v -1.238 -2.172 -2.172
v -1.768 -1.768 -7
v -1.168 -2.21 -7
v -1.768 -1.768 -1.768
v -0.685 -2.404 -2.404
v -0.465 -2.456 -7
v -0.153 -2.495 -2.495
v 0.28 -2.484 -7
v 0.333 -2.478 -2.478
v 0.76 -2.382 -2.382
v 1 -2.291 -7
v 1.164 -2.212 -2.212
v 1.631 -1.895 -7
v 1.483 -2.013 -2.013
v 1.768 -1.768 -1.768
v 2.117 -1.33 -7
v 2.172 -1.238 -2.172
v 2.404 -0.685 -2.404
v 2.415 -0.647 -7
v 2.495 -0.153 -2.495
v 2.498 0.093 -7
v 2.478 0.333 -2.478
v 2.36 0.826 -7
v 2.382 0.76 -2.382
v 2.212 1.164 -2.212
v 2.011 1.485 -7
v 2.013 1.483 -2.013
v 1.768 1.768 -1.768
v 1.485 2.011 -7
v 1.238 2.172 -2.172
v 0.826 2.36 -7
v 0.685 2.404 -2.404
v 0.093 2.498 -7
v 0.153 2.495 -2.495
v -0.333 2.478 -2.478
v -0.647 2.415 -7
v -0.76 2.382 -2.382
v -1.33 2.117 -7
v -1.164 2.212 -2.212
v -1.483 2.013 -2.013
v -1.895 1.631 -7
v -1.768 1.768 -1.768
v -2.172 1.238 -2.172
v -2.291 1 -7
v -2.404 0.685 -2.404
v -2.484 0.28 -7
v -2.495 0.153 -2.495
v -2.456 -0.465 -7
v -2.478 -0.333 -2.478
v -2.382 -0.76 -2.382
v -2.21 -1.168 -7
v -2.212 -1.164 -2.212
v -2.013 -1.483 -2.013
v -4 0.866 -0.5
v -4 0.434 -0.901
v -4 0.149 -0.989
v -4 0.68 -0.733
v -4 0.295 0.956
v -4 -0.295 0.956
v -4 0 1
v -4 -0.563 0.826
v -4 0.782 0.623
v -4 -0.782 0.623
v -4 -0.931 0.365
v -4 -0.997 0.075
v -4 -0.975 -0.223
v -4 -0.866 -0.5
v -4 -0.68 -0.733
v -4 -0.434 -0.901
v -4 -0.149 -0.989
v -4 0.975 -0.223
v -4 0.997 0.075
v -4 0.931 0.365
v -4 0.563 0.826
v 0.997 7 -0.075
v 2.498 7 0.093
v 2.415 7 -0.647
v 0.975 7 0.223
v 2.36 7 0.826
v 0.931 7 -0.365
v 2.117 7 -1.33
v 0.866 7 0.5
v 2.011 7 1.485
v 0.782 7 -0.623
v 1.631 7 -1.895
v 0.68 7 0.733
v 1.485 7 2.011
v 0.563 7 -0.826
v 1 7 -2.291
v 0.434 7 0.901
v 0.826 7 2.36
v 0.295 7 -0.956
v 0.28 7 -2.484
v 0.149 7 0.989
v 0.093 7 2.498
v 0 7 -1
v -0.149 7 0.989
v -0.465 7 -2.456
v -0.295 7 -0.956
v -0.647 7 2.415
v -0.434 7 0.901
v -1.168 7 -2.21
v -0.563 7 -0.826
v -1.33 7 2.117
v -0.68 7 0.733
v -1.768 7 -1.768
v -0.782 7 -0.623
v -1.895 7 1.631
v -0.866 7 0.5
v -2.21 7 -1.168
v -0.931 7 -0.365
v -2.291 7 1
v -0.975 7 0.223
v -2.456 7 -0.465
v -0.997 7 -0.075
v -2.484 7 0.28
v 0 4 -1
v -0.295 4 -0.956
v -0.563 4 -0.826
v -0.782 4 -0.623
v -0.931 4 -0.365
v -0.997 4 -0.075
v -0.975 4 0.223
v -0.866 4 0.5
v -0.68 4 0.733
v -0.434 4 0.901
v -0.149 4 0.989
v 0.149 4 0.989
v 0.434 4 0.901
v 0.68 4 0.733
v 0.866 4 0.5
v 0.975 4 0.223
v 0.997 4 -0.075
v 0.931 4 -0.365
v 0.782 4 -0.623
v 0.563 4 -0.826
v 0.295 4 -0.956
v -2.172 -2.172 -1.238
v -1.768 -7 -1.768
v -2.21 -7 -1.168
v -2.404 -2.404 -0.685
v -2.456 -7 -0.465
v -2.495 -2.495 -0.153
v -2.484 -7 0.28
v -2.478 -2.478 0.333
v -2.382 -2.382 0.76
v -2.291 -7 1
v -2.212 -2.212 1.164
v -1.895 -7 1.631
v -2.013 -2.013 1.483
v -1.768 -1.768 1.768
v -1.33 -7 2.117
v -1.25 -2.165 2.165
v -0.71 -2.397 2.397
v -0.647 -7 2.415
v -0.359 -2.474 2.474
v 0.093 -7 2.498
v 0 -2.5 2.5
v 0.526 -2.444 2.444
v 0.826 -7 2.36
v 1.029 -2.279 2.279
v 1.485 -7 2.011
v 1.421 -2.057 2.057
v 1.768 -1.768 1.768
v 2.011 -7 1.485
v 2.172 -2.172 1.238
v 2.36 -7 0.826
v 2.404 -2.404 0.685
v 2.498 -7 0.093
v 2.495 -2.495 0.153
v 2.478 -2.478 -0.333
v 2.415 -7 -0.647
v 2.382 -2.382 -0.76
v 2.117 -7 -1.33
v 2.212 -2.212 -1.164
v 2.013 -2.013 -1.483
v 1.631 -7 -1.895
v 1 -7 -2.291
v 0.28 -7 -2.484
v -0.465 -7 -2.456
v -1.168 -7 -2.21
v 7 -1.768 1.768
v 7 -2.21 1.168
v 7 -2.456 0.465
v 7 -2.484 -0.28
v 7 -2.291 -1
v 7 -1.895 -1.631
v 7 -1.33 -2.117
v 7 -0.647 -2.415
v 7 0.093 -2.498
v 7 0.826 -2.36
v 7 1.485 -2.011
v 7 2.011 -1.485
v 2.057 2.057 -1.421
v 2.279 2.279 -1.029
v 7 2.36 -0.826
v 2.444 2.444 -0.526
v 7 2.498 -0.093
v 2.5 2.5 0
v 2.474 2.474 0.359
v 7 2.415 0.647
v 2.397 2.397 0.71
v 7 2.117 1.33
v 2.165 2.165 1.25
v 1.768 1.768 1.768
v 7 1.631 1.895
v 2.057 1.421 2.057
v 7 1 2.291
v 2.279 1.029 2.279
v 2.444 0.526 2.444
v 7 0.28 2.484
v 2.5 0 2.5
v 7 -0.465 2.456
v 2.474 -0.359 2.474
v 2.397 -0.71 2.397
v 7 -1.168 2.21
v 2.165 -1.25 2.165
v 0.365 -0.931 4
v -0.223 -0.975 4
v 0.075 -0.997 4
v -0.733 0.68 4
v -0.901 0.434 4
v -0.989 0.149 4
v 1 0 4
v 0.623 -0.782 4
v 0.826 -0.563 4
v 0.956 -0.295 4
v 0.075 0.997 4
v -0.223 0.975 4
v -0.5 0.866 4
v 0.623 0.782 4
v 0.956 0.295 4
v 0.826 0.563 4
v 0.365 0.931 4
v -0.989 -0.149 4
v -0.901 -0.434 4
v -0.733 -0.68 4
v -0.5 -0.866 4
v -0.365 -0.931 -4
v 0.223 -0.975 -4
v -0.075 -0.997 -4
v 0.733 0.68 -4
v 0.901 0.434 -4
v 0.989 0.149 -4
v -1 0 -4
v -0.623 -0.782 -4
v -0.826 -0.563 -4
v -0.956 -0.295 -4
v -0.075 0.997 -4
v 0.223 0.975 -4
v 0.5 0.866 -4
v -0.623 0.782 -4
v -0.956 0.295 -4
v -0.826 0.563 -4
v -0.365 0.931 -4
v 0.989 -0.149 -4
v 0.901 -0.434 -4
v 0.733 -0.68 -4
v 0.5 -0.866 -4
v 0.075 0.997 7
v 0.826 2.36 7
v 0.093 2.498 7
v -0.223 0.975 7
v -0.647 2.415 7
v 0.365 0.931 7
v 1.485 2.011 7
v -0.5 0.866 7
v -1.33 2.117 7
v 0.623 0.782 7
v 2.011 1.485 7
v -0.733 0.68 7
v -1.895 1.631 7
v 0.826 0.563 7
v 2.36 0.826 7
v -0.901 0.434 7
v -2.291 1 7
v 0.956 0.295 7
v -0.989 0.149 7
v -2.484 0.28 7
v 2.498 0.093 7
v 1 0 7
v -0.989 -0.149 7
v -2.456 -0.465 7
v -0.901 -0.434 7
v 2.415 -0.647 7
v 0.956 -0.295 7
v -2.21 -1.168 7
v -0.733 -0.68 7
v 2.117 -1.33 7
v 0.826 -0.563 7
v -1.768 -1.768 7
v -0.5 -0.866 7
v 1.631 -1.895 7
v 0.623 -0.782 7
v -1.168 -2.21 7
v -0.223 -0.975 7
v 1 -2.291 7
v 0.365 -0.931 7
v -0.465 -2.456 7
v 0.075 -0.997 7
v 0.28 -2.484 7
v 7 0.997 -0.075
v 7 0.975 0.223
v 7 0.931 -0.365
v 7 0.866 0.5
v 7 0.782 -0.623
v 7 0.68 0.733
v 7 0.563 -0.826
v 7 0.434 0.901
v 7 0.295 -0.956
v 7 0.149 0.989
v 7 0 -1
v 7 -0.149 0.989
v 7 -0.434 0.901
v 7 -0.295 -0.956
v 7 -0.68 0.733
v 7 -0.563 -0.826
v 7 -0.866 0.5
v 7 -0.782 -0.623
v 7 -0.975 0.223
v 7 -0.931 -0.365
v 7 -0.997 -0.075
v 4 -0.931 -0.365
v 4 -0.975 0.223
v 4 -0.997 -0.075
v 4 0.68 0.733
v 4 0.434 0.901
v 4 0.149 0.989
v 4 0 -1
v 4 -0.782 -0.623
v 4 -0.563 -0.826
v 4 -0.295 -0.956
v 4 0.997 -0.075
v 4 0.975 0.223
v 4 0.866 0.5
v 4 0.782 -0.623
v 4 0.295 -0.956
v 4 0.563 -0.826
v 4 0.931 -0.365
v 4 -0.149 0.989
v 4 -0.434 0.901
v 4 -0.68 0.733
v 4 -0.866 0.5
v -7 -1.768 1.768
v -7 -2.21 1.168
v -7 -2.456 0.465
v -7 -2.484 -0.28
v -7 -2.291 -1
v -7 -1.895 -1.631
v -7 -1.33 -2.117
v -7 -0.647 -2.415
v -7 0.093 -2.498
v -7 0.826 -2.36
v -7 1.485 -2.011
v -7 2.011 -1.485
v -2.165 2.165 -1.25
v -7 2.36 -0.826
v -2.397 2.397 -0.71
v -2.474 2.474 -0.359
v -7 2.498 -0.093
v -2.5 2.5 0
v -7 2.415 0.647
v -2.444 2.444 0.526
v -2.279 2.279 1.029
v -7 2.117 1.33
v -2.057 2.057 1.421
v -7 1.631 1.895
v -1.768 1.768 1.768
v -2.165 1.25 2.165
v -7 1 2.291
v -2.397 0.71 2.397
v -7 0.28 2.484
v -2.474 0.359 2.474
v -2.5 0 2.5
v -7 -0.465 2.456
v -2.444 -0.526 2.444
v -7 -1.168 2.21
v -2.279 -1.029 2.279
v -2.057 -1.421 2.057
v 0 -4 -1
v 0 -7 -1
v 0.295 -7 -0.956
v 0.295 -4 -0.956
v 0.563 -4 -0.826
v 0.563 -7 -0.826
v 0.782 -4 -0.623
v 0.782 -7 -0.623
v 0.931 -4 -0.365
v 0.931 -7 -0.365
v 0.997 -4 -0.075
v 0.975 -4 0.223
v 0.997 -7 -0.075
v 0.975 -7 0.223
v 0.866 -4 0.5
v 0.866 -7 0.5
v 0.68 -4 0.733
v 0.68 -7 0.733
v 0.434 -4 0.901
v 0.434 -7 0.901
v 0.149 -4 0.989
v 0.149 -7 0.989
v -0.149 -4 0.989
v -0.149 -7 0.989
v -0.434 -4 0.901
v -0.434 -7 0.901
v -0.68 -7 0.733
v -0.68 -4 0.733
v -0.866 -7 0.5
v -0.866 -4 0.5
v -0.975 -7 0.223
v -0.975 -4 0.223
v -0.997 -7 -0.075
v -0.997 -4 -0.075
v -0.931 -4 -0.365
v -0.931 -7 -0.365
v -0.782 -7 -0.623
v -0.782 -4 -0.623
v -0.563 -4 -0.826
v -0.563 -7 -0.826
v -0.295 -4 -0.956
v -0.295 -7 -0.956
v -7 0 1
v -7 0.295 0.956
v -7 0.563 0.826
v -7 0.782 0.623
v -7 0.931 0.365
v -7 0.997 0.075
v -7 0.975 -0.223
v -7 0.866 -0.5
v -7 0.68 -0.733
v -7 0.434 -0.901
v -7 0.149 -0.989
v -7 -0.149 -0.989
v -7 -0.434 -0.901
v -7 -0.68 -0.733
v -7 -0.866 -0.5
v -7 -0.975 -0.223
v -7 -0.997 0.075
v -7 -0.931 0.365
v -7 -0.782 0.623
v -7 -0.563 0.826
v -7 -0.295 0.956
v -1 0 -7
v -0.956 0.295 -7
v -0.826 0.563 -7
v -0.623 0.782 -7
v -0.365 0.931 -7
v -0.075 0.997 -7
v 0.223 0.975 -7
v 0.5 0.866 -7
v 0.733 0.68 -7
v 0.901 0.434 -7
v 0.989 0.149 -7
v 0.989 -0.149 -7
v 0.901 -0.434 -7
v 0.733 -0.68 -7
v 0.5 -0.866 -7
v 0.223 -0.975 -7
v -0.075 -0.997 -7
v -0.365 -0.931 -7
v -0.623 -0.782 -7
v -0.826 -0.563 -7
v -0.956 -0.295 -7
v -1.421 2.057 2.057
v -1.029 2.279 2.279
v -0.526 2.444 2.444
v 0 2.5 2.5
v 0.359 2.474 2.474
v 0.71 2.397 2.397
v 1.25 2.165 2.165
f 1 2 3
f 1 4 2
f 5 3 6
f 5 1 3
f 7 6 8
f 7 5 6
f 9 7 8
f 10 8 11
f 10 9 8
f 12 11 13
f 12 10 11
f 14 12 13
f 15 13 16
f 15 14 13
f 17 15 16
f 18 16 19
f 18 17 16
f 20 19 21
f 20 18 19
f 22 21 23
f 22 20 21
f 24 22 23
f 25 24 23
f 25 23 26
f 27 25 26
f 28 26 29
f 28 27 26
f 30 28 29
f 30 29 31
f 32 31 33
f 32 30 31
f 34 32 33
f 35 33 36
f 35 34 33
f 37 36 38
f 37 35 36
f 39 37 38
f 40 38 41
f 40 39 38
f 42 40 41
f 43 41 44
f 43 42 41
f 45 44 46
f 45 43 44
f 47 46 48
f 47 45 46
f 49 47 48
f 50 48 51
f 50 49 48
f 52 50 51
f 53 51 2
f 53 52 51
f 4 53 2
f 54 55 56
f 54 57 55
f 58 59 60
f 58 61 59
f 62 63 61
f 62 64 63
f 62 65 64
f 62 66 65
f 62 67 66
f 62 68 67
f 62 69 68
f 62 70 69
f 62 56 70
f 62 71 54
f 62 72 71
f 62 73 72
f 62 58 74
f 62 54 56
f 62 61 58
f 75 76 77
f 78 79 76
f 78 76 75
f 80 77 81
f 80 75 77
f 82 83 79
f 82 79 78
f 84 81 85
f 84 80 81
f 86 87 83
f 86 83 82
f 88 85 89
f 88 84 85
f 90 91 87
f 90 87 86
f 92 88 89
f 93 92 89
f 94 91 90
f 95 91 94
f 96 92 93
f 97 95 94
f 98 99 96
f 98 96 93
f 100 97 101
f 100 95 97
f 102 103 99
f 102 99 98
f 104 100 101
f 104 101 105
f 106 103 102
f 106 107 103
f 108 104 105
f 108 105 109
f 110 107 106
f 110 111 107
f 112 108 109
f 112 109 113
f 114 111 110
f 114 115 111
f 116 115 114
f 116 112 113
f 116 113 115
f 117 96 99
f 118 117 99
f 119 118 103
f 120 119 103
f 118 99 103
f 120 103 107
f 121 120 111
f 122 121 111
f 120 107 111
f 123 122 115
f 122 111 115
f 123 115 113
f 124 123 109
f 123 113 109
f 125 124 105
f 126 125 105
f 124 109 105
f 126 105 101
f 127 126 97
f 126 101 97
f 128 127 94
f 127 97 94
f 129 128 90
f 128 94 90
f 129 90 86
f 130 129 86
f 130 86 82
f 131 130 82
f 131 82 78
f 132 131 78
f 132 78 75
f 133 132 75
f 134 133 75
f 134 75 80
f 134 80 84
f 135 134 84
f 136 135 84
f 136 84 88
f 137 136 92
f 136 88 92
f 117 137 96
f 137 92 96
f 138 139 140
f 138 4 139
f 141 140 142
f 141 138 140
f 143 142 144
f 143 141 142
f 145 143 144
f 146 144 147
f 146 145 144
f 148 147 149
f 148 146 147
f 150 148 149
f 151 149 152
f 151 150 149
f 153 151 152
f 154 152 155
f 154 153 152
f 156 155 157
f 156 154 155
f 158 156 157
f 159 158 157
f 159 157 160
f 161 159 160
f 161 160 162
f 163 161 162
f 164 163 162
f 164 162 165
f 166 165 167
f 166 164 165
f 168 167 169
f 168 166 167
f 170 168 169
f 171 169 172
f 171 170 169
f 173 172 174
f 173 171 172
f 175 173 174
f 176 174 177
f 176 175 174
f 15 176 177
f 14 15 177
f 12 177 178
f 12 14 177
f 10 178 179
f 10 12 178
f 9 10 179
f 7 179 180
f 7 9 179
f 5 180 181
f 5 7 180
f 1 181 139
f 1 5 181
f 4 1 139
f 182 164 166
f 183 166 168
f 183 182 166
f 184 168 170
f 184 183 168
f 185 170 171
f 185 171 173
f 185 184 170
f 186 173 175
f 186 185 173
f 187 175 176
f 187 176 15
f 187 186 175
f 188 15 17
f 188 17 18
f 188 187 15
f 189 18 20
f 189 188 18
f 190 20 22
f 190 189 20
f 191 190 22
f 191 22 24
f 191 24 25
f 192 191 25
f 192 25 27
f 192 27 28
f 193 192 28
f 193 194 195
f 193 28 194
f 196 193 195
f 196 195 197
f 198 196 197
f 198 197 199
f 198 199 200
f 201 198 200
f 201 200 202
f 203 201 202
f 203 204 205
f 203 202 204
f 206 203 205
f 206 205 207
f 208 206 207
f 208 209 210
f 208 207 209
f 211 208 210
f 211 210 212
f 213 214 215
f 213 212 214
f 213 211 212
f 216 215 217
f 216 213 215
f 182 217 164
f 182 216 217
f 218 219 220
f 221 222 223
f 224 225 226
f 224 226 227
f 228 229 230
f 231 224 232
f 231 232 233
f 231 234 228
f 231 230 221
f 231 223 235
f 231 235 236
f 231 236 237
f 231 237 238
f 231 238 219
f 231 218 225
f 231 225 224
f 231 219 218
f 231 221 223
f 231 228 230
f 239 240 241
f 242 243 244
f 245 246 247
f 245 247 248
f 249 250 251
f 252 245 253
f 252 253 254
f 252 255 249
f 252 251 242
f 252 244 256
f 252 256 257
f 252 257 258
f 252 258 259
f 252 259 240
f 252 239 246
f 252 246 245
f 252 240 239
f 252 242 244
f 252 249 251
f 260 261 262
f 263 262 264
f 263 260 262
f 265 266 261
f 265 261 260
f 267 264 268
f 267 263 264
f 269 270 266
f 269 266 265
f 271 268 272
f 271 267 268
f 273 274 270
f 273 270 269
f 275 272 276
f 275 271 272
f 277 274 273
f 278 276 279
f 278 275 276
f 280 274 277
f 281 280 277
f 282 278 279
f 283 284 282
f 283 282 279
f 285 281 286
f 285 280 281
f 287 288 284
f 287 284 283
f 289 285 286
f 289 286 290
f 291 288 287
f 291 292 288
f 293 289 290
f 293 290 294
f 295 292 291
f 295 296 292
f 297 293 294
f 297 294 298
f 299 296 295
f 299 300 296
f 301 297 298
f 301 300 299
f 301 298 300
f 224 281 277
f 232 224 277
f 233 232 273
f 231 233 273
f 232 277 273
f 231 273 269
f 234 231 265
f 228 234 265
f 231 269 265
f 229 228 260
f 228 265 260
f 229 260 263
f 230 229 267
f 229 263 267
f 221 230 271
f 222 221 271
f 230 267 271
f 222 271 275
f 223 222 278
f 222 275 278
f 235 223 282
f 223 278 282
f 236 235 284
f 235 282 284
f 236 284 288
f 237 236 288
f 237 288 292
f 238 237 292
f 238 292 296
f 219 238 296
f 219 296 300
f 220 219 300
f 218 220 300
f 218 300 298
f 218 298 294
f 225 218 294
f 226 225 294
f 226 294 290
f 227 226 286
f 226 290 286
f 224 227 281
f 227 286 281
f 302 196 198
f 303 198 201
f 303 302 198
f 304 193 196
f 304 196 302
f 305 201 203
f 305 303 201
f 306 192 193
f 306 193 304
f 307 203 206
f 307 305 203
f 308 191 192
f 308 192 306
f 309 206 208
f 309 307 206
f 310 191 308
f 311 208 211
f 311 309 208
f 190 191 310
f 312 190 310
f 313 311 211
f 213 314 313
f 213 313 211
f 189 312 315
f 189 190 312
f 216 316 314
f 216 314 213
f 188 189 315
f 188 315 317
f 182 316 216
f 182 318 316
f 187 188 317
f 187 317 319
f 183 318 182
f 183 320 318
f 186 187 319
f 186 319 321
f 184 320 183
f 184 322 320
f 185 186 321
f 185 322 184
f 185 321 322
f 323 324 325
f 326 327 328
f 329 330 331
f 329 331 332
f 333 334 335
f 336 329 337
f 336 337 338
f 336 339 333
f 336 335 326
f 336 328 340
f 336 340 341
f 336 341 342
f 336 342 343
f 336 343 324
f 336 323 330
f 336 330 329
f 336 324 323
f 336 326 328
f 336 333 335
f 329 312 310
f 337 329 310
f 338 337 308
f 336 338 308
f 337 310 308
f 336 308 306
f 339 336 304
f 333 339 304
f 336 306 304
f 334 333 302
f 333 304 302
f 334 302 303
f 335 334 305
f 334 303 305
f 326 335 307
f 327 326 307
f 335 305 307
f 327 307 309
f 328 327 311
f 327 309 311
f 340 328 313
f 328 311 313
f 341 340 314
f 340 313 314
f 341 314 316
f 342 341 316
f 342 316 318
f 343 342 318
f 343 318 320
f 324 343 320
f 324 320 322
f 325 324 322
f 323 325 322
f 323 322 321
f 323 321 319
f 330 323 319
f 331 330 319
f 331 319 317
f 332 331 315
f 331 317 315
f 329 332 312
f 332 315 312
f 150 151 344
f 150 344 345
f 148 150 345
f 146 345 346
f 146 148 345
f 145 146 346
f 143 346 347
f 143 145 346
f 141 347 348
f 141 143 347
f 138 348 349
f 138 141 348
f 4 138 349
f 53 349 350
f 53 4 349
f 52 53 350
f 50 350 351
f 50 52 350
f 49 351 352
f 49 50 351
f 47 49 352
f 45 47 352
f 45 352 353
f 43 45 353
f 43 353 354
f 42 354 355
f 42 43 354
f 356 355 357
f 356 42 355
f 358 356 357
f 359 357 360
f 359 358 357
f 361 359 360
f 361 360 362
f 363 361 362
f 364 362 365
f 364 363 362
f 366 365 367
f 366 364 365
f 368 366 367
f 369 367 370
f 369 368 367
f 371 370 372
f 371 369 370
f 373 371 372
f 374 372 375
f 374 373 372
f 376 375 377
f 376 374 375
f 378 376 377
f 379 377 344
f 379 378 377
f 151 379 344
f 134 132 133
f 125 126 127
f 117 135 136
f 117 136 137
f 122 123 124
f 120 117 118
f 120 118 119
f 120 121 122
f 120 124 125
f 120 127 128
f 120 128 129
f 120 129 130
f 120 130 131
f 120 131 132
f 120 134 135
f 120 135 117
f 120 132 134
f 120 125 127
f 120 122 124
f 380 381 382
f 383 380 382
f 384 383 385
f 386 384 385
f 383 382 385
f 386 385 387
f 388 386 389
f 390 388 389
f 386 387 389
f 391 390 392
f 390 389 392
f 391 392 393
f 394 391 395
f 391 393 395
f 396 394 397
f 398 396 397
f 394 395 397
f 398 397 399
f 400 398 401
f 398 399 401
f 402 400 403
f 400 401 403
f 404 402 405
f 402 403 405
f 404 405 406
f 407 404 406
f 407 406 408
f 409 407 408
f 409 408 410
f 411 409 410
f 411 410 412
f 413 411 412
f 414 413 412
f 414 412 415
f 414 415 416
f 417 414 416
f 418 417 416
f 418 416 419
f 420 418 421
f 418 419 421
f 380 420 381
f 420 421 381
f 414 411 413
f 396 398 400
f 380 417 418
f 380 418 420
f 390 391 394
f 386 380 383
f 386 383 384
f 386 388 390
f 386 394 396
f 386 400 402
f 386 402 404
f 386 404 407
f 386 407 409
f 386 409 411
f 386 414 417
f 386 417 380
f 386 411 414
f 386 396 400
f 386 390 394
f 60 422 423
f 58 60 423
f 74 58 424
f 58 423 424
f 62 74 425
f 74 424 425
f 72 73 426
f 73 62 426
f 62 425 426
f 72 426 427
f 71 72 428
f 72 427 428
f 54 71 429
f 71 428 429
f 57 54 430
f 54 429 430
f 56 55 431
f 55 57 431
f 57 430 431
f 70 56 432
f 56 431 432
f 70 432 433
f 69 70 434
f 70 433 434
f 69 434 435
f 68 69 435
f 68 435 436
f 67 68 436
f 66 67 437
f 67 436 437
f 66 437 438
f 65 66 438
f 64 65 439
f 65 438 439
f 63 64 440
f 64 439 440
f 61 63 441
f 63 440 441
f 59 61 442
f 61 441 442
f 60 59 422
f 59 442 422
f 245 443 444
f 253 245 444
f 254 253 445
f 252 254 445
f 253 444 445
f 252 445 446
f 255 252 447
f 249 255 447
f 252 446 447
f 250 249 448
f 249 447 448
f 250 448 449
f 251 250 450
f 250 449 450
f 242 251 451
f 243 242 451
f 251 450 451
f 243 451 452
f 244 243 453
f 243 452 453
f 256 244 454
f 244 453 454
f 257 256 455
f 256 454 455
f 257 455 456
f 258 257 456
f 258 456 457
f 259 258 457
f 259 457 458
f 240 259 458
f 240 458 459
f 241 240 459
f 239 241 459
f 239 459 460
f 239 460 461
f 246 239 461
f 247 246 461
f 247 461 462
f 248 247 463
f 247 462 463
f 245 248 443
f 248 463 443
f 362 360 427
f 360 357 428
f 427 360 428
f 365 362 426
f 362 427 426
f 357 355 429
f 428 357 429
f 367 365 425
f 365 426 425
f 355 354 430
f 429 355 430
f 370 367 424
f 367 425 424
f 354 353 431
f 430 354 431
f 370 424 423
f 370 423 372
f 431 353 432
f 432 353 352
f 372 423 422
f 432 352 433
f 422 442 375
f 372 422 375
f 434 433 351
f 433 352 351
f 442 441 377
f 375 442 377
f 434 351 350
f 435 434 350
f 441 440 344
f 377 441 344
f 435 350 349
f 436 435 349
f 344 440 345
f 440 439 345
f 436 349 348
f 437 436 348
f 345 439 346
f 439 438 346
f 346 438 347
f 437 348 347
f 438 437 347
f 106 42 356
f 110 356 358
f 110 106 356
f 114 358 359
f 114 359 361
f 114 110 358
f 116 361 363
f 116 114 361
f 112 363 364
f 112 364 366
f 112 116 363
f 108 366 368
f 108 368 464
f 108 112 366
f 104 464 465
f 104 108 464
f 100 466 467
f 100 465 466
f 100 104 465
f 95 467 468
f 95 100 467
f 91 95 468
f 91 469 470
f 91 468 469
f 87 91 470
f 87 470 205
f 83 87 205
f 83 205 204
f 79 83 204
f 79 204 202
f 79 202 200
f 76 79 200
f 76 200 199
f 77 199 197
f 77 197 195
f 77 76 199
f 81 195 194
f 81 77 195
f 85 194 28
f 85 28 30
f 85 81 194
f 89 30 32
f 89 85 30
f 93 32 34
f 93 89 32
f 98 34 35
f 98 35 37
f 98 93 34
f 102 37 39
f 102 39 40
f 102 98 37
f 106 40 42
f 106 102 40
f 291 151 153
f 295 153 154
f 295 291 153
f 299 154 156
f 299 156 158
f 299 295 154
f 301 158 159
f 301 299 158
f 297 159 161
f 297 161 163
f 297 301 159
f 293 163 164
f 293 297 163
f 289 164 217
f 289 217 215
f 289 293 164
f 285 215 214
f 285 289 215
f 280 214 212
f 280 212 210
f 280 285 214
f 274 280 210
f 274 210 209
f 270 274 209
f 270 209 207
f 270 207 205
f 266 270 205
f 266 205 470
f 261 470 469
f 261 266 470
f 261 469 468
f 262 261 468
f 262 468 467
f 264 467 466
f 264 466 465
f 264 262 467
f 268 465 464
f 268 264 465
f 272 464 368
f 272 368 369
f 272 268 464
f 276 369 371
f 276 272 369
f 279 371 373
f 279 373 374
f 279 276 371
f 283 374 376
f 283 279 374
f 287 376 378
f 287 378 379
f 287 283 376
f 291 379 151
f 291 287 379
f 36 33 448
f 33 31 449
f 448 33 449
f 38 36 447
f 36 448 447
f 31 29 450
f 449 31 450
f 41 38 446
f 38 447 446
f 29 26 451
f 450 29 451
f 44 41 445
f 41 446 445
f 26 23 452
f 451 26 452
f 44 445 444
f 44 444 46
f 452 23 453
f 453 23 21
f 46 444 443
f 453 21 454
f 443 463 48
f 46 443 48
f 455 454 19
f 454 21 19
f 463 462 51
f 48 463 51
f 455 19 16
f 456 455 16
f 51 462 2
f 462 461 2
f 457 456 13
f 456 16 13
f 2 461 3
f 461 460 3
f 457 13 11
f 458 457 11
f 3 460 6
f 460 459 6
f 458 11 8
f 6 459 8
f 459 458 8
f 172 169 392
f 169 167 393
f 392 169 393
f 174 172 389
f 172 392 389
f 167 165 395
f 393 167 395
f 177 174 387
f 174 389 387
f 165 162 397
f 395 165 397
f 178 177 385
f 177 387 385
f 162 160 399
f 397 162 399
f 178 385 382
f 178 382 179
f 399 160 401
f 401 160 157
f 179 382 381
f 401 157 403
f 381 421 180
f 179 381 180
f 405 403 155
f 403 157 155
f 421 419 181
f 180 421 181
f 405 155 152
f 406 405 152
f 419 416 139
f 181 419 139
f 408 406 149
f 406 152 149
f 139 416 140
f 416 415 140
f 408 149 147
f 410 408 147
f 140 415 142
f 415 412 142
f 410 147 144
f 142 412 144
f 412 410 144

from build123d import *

# Parameters (mm, degrees)
SKETCH1_R           = 2.5
BASE_EXTRUDE_DEPTH  = 7
SKETCH2_R           = 2.5
BOSS_EXTRUDE3_DEPTH = 7
SKETCH3_R           = 2.5
BOSS_EXTRUDE4_DEPTH = 7
SKETCH8_R           = 1
CUT_EXTRUDE2_DEPTH  = 3
CIRPATTERN4_COUNT   = 4
CIRPATTERN5_COUNT   = 4


with BuildPart() as part:
    # Sketch1 → Base-Extrude (new, symmetric)
    with BuildSketch(Plane.XY):
        with Locations(Location((0, 0, 0), (0, 0, 225))):
            Circle(SKETCH1_R)
    extrude(amount=BASE_EXTRUDE_DEPTH, both=True)

    # Sketch2 → Boss-Extrude3 (add, symmetric)
    with BuildSketch(Plane(origin=(0, 0, 0), x_dir=(1, 0, 0), z_dir=(0, 1, 0))):
        with Locations(Location((0, 0, 0), (0, 0, 135))):
            Circle(SKETCH2_R)
    extrude(amount=BOSS_EXTRUDE3_DEPTH, both=True)

    # Sketch3 → Boss-Extrude4 (add, symmetric)
    with BuildSketch(Plane(origin=(0, 0, 0), x_dir=(0, 0, -1), z_dir=(1, 0, 0))):
        with Locations(Location((0, 0, 0), (0, 0, 225))):
            Circle(SKETCH3_R)
    extrude(amount=BOSS_EXTRUDE4_DEPTH, both=True)

    # Sketch8 → Cut-Extrude2 (cut)
    with BuildSketch(Plane(origin=(7, 0, 0), x_dir=(0, 0, -1), z_dir=(1, 0, 0))):
        Circle(SKETCH8_R)
    cut_extrude2 = extrude(amount=-CUT_EXTRUDE2_DEPTH, mode=Mode.SUBTRACT)

    # CirPattern4: Cut-Extrude2 ×4 about axis
    cirpattern4_axis = Axis((0, 0, 0), (0, 1, 0))
    for i in range(1, CIRPATTERN4_COUNT):
        add(cut_extrude2.rotate(cirpattern4_axis, i * 360 / CIRPATTERN4_COUNT), mode=Mode.SUBTRACT)

    # CirPattern5: Cut-Extrude2 ×4 about axis
    cirpattern5_axis = Axis((0, 0, 0), (0, 0, 1))
    for i in range(1, CIRPATTERN5_COUNT):
        add(cut_extrude2.rotate(cirpattern5_axis, i * 360 / CIRPATTERN5_COUNT), mode=Mode.SUBTRACT)


solid = part.part
